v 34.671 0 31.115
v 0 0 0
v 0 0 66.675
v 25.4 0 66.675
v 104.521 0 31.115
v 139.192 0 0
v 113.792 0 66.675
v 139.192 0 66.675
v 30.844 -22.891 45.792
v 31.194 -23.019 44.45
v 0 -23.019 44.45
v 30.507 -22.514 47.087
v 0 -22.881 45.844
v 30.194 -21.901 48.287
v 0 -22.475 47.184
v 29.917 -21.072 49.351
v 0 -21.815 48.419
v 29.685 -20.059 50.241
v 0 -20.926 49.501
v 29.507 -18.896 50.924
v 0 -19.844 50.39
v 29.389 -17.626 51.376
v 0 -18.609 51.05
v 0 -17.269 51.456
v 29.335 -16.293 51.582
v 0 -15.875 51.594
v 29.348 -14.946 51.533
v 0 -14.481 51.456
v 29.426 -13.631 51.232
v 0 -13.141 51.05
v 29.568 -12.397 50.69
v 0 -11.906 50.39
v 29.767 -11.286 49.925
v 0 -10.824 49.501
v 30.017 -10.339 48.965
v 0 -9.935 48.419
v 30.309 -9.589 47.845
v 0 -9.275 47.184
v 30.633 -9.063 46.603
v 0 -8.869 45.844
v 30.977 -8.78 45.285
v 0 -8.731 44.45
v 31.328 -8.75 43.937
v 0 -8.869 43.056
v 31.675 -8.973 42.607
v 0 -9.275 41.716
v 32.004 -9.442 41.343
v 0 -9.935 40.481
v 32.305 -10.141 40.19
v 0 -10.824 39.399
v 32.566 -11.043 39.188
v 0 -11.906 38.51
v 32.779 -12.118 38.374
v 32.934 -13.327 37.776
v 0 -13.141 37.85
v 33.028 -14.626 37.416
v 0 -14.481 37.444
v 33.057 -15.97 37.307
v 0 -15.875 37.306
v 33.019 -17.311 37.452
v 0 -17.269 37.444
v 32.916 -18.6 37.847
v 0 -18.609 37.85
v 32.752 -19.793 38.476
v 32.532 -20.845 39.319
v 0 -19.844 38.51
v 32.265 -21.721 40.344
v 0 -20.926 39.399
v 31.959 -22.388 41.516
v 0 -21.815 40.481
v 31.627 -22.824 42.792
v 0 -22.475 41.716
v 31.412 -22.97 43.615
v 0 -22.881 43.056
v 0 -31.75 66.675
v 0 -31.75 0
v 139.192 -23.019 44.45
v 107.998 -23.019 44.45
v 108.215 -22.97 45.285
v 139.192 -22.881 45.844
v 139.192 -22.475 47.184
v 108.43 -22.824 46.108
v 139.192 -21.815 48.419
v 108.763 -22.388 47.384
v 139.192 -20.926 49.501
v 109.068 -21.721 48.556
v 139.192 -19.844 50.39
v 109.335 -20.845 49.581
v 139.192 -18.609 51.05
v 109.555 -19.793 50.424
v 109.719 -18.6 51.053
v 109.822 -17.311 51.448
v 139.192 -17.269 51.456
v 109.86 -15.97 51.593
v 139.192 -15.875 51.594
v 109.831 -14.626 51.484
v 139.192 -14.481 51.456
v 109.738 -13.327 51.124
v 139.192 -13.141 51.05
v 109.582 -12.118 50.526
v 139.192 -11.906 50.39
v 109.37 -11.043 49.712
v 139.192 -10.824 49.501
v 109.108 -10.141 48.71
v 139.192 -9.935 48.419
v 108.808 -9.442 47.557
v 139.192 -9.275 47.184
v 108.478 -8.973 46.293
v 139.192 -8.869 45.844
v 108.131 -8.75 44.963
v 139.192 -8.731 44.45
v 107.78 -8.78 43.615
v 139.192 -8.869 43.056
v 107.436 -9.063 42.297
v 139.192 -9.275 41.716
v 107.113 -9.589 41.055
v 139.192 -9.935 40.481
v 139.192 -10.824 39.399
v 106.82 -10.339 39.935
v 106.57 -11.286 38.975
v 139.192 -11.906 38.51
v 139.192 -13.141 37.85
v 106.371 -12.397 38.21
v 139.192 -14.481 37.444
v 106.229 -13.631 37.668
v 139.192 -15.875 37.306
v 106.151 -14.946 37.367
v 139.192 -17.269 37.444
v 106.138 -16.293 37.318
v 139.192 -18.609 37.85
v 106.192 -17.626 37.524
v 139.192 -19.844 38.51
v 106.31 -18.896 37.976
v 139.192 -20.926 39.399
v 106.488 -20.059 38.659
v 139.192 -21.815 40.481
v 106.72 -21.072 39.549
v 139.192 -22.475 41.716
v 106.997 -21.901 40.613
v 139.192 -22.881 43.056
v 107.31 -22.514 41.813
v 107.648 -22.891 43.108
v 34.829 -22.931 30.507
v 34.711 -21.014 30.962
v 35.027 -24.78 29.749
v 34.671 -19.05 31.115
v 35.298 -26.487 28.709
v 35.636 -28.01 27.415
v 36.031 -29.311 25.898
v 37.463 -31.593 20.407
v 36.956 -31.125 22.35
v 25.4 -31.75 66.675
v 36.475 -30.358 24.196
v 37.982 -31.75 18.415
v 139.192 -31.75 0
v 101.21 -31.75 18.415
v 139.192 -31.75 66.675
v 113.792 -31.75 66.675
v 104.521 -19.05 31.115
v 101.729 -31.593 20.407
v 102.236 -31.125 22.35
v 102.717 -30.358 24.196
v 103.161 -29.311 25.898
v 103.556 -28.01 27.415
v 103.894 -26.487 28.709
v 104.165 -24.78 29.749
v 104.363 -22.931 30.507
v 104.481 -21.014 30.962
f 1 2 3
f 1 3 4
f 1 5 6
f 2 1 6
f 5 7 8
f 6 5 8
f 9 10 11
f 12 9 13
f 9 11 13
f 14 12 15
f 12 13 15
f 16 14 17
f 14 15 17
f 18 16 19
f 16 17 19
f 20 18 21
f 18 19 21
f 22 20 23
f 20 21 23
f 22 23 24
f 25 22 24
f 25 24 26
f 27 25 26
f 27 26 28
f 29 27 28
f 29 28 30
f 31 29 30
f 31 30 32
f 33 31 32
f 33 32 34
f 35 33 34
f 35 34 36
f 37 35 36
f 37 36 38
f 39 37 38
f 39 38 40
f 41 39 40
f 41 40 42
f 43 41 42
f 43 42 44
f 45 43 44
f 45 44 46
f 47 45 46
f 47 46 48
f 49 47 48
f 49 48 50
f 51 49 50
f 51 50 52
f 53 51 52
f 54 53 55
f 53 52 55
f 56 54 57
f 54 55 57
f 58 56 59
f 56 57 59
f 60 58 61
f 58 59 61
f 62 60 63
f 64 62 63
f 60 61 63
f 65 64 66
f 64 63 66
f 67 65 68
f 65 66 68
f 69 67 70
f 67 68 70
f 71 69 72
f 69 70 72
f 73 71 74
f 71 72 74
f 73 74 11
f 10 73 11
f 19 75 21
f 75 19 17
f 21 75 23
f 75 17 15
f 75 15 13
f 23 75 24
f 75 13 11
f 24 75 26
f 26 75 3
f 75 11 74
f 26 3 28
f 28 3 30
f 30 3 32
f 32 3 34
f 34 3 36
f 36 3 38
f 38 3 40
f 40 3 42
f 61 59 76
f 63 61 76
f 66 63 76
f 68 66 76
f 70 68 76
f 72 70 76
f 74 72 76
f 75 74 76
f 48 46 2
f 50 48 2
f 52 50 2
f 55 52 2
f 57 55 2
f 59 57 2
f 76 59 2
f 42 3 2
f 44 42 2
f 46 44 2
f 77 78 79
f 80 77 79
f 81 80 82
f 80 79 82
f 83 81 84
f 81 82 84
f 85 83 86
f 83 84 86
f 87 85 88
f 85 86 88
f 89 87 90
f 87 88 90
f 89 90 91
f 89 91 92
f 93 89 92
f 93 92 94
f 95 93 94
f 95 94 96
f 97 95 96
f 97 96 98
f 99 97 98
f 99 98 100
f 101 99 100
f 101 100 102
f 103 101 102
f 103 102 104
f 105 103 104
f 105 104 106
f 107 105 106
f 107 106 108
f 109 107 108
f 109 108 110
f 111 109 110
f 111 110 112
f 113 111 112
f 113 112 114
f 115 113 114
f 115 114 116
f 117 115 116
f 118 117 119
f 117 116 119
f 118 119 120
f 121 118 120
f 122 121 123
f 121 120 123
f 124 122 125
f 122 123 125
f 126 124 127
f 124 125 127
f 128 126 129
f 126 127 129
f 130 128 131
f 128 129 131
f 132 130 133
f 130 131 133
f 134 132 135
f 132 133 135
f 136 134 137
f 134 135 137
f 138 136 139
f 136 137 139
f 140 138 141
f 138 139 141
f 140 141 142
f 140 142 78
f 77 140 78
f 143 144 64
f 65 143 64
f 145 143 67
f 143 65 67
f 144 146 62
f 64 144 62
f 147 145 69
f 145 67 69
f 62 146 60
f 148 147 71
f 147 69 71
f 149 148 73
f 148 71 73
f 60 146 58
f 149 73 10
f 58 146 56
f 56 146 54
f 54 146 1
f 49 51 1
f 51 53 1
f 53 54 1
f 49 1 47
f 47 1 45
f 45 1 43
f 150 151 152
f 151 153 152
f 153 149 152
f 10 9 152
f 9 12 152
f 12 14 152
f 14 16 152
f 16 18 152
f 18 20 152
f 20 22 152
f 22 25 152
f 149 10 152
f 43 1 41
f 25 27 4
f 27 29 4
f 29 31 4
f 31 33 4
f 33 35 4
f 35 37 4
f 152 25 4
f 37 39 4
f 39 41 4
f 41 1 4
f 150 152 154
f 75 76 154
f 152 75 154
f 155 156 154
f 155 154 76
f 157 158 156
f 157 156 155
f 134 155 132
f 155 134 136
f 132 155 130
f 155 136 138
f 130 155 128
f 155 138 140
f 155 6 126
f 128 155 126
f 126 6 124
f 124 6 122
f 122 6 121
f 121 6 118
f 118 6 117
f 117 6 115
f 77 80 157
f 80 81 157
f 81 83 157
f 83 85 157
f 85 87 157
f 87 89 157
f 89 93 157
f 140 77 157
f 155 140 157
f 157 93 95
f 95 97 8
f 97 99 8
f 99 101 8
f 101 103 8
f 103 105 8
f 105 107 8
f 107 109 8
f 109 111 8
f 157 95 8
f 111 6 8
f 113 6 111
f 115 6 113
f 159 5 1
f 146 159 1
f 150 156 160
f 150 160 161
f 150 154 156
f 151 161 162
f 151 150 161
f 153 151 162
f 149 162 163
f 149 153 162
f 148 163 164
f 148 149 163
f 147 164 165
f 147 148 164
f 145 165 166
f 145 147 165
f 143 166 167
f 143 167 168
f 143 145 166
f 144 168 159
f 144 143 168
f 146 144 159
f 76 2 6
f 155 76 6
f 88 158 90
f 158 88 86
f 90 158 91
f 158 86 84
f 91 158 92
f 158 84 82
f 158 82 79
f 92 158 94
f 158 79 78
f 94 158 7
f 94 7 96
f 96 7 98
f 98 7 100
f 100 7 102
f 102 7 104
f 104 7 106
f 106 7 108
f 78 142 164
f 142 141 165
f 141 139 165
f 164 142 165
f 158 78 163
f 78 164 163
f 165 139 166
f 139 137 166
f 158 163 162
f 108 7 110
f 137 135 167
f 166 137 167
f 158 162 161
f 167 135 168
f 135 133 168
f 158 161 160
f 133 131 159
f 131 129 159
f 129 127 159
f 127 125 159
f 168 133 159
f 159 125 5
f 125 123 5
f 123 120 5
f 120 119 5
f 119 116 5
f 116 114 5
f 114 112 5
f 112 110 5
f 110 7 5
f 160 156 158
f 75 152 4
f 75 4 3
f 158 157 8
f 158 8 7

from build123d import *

# Parameters (mm, degrees)
F1_DEPTH = 31.75
F3_D     = 14.2875
F4_R     = 12.7


# Not quite as in the source:
# - a length typed as a fraction of an inch, garbled in the dataset ("3 / 203.2 mm" for 3/8 in), is restored


with BuildPart() as f1:
    # F0 (on Front) → F1 (new body)
    with BuildSketch(Plane.XZ):
        Polygon((0, 66.675), (0, 0), (139.192, 0), (139.192, 66.675), (113.792, 66.675), (104.521, 31.115), (34.671, 31.115), (25.4, 66.675), align=None)
    extrude(amount=F1_DEPTH)

    # F3 (through all)
    with Locations(Plane.YZ.offset(139.192)):
        with Locations((-15.875, 44.45)):
            Hole(F3_D / 2)

    # F4
    f4_edges = [f1.edges().sort_by_distance(p)[0] for p in [
        (69.596, -31.75, 31.115),
    ]]
    fillet(f4_edges, radius=F4_R)


solid = f1.part
